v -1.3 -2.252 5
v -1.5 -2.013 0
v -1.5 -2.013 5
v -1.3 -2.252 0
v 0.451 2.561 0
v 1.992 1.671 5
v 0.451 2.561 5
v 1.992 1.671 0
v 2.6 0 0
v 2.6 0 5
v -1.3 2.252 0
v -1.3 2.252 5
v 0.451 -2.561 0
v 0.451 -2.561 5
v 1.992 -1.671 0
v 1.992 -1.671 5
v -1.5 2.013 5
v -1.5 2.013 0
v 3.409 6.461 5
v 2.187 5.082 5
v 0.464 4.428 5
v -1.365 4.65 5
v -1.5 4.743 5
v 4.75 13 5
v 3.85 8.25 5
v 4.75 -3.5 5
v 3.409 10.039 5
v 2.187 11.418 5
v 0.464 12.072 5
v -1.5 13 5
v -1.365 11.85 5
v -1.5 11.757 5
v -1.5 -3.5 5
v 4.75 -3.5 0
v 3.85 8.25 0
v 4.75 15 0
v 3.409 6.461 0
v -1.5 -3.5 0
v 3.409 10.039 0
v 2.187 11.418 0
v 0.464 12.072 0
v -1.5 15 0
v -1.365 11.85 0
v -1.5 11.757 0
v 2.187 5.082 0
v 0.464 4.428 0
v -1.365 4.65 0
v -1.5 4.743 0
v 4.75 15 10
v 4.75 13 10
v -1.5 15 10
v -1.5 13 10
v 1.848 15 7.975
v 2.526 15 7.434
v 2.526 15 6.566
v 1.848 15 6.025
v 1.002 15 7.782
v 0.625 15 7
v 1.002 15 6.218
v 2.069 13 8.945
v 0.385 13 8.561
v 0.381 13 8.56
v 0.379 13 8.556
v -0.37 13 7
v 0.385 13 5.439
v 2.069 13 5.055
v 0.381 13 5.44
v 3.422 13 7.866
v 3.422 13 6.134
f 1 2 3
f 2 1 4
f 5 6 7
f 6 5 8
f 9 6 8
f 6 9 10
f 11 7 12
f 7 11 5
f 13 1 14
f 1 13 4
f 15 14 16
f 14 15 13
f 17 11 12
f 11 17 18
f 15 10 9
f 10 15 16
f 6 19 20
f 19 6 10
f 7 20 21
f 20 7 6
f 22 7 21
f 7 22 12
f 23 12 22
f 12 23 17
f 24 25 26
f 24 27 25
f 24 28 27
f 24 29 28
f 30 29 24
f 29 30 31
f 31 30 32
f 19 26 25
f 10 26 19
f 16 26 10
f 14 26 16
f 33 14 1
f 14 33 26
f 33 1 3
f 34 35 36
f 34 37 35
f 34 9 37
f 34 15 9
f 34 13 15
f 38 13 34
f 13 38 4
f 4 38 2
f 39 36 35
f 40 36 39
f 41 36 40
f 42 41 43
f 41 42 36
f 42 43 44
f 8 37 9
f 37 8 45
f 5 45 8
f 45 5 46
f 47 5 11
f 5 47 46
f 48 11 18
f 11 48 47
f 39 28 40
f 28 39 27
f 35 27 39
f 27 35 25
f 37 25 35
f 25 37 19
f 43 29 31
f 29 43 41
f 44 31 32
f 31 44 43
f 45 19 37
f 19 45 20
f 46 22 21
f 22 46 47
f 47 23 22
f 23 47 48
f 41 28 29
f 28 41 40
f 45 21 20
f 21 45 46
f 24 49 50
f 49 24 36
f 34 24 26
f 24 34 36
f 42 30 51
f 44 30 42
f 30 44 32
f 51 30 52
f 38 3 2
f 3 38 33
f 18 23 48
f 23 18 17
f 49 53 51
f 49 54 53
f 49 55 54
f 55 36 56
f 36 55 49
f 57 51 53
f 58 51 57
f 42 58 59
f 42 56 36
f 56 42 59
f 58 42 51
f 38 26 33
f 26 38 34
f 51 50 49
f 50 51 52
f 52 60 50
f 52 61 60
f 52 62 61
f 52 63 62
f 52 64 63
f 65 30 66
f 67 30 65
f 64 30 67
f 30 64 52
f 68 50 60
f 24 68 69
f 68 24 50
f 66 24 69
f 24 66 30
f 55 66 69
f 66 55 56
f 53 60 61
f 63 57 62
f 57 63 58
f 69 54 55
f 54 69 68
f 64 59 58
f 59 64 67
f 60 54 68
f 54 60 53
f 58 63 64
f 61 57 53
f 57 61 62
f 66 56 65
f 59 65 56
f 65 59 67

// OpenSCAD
// screw sizing
r1=1;
r2=2;

// cable sizing
rsm = 5 / 2;
rlrg = 7.5 / 2;
shift = 1.5;

// general sizing
between = 2;
h=5;

module clip(){
    difference(){
        translate([-shift, -(rsm + between / 2), 0]) 
        cube([rlrg + shift + between / 2, 2 * rsm + 2 * rlrg + 3 * between, h]);
        union(){
            cylinder(h=h,r=rsm + .1 );
            translate([0,rsm + rlrg + between,0]) cylinder(h=h,r=rlrg + .1);
        }
    }
}

module wallhole(x=rlrg + shift + between / 2, y=between, z=10, r1=r1, r2=r2){
    difference(){
        cube([x,y,z]);
        translate([x/2,0,z - between / 2 - r2 ]) rotate([-90,0,0]) cylinder(h=y+0.01, r1=r1, r2=r2);
        }
    }


clip();
translate([rlrg + between/2,  rsm + 2 * rlrg + 2.5 * between, 0]) rotate([0,0,180]) wallhole();
